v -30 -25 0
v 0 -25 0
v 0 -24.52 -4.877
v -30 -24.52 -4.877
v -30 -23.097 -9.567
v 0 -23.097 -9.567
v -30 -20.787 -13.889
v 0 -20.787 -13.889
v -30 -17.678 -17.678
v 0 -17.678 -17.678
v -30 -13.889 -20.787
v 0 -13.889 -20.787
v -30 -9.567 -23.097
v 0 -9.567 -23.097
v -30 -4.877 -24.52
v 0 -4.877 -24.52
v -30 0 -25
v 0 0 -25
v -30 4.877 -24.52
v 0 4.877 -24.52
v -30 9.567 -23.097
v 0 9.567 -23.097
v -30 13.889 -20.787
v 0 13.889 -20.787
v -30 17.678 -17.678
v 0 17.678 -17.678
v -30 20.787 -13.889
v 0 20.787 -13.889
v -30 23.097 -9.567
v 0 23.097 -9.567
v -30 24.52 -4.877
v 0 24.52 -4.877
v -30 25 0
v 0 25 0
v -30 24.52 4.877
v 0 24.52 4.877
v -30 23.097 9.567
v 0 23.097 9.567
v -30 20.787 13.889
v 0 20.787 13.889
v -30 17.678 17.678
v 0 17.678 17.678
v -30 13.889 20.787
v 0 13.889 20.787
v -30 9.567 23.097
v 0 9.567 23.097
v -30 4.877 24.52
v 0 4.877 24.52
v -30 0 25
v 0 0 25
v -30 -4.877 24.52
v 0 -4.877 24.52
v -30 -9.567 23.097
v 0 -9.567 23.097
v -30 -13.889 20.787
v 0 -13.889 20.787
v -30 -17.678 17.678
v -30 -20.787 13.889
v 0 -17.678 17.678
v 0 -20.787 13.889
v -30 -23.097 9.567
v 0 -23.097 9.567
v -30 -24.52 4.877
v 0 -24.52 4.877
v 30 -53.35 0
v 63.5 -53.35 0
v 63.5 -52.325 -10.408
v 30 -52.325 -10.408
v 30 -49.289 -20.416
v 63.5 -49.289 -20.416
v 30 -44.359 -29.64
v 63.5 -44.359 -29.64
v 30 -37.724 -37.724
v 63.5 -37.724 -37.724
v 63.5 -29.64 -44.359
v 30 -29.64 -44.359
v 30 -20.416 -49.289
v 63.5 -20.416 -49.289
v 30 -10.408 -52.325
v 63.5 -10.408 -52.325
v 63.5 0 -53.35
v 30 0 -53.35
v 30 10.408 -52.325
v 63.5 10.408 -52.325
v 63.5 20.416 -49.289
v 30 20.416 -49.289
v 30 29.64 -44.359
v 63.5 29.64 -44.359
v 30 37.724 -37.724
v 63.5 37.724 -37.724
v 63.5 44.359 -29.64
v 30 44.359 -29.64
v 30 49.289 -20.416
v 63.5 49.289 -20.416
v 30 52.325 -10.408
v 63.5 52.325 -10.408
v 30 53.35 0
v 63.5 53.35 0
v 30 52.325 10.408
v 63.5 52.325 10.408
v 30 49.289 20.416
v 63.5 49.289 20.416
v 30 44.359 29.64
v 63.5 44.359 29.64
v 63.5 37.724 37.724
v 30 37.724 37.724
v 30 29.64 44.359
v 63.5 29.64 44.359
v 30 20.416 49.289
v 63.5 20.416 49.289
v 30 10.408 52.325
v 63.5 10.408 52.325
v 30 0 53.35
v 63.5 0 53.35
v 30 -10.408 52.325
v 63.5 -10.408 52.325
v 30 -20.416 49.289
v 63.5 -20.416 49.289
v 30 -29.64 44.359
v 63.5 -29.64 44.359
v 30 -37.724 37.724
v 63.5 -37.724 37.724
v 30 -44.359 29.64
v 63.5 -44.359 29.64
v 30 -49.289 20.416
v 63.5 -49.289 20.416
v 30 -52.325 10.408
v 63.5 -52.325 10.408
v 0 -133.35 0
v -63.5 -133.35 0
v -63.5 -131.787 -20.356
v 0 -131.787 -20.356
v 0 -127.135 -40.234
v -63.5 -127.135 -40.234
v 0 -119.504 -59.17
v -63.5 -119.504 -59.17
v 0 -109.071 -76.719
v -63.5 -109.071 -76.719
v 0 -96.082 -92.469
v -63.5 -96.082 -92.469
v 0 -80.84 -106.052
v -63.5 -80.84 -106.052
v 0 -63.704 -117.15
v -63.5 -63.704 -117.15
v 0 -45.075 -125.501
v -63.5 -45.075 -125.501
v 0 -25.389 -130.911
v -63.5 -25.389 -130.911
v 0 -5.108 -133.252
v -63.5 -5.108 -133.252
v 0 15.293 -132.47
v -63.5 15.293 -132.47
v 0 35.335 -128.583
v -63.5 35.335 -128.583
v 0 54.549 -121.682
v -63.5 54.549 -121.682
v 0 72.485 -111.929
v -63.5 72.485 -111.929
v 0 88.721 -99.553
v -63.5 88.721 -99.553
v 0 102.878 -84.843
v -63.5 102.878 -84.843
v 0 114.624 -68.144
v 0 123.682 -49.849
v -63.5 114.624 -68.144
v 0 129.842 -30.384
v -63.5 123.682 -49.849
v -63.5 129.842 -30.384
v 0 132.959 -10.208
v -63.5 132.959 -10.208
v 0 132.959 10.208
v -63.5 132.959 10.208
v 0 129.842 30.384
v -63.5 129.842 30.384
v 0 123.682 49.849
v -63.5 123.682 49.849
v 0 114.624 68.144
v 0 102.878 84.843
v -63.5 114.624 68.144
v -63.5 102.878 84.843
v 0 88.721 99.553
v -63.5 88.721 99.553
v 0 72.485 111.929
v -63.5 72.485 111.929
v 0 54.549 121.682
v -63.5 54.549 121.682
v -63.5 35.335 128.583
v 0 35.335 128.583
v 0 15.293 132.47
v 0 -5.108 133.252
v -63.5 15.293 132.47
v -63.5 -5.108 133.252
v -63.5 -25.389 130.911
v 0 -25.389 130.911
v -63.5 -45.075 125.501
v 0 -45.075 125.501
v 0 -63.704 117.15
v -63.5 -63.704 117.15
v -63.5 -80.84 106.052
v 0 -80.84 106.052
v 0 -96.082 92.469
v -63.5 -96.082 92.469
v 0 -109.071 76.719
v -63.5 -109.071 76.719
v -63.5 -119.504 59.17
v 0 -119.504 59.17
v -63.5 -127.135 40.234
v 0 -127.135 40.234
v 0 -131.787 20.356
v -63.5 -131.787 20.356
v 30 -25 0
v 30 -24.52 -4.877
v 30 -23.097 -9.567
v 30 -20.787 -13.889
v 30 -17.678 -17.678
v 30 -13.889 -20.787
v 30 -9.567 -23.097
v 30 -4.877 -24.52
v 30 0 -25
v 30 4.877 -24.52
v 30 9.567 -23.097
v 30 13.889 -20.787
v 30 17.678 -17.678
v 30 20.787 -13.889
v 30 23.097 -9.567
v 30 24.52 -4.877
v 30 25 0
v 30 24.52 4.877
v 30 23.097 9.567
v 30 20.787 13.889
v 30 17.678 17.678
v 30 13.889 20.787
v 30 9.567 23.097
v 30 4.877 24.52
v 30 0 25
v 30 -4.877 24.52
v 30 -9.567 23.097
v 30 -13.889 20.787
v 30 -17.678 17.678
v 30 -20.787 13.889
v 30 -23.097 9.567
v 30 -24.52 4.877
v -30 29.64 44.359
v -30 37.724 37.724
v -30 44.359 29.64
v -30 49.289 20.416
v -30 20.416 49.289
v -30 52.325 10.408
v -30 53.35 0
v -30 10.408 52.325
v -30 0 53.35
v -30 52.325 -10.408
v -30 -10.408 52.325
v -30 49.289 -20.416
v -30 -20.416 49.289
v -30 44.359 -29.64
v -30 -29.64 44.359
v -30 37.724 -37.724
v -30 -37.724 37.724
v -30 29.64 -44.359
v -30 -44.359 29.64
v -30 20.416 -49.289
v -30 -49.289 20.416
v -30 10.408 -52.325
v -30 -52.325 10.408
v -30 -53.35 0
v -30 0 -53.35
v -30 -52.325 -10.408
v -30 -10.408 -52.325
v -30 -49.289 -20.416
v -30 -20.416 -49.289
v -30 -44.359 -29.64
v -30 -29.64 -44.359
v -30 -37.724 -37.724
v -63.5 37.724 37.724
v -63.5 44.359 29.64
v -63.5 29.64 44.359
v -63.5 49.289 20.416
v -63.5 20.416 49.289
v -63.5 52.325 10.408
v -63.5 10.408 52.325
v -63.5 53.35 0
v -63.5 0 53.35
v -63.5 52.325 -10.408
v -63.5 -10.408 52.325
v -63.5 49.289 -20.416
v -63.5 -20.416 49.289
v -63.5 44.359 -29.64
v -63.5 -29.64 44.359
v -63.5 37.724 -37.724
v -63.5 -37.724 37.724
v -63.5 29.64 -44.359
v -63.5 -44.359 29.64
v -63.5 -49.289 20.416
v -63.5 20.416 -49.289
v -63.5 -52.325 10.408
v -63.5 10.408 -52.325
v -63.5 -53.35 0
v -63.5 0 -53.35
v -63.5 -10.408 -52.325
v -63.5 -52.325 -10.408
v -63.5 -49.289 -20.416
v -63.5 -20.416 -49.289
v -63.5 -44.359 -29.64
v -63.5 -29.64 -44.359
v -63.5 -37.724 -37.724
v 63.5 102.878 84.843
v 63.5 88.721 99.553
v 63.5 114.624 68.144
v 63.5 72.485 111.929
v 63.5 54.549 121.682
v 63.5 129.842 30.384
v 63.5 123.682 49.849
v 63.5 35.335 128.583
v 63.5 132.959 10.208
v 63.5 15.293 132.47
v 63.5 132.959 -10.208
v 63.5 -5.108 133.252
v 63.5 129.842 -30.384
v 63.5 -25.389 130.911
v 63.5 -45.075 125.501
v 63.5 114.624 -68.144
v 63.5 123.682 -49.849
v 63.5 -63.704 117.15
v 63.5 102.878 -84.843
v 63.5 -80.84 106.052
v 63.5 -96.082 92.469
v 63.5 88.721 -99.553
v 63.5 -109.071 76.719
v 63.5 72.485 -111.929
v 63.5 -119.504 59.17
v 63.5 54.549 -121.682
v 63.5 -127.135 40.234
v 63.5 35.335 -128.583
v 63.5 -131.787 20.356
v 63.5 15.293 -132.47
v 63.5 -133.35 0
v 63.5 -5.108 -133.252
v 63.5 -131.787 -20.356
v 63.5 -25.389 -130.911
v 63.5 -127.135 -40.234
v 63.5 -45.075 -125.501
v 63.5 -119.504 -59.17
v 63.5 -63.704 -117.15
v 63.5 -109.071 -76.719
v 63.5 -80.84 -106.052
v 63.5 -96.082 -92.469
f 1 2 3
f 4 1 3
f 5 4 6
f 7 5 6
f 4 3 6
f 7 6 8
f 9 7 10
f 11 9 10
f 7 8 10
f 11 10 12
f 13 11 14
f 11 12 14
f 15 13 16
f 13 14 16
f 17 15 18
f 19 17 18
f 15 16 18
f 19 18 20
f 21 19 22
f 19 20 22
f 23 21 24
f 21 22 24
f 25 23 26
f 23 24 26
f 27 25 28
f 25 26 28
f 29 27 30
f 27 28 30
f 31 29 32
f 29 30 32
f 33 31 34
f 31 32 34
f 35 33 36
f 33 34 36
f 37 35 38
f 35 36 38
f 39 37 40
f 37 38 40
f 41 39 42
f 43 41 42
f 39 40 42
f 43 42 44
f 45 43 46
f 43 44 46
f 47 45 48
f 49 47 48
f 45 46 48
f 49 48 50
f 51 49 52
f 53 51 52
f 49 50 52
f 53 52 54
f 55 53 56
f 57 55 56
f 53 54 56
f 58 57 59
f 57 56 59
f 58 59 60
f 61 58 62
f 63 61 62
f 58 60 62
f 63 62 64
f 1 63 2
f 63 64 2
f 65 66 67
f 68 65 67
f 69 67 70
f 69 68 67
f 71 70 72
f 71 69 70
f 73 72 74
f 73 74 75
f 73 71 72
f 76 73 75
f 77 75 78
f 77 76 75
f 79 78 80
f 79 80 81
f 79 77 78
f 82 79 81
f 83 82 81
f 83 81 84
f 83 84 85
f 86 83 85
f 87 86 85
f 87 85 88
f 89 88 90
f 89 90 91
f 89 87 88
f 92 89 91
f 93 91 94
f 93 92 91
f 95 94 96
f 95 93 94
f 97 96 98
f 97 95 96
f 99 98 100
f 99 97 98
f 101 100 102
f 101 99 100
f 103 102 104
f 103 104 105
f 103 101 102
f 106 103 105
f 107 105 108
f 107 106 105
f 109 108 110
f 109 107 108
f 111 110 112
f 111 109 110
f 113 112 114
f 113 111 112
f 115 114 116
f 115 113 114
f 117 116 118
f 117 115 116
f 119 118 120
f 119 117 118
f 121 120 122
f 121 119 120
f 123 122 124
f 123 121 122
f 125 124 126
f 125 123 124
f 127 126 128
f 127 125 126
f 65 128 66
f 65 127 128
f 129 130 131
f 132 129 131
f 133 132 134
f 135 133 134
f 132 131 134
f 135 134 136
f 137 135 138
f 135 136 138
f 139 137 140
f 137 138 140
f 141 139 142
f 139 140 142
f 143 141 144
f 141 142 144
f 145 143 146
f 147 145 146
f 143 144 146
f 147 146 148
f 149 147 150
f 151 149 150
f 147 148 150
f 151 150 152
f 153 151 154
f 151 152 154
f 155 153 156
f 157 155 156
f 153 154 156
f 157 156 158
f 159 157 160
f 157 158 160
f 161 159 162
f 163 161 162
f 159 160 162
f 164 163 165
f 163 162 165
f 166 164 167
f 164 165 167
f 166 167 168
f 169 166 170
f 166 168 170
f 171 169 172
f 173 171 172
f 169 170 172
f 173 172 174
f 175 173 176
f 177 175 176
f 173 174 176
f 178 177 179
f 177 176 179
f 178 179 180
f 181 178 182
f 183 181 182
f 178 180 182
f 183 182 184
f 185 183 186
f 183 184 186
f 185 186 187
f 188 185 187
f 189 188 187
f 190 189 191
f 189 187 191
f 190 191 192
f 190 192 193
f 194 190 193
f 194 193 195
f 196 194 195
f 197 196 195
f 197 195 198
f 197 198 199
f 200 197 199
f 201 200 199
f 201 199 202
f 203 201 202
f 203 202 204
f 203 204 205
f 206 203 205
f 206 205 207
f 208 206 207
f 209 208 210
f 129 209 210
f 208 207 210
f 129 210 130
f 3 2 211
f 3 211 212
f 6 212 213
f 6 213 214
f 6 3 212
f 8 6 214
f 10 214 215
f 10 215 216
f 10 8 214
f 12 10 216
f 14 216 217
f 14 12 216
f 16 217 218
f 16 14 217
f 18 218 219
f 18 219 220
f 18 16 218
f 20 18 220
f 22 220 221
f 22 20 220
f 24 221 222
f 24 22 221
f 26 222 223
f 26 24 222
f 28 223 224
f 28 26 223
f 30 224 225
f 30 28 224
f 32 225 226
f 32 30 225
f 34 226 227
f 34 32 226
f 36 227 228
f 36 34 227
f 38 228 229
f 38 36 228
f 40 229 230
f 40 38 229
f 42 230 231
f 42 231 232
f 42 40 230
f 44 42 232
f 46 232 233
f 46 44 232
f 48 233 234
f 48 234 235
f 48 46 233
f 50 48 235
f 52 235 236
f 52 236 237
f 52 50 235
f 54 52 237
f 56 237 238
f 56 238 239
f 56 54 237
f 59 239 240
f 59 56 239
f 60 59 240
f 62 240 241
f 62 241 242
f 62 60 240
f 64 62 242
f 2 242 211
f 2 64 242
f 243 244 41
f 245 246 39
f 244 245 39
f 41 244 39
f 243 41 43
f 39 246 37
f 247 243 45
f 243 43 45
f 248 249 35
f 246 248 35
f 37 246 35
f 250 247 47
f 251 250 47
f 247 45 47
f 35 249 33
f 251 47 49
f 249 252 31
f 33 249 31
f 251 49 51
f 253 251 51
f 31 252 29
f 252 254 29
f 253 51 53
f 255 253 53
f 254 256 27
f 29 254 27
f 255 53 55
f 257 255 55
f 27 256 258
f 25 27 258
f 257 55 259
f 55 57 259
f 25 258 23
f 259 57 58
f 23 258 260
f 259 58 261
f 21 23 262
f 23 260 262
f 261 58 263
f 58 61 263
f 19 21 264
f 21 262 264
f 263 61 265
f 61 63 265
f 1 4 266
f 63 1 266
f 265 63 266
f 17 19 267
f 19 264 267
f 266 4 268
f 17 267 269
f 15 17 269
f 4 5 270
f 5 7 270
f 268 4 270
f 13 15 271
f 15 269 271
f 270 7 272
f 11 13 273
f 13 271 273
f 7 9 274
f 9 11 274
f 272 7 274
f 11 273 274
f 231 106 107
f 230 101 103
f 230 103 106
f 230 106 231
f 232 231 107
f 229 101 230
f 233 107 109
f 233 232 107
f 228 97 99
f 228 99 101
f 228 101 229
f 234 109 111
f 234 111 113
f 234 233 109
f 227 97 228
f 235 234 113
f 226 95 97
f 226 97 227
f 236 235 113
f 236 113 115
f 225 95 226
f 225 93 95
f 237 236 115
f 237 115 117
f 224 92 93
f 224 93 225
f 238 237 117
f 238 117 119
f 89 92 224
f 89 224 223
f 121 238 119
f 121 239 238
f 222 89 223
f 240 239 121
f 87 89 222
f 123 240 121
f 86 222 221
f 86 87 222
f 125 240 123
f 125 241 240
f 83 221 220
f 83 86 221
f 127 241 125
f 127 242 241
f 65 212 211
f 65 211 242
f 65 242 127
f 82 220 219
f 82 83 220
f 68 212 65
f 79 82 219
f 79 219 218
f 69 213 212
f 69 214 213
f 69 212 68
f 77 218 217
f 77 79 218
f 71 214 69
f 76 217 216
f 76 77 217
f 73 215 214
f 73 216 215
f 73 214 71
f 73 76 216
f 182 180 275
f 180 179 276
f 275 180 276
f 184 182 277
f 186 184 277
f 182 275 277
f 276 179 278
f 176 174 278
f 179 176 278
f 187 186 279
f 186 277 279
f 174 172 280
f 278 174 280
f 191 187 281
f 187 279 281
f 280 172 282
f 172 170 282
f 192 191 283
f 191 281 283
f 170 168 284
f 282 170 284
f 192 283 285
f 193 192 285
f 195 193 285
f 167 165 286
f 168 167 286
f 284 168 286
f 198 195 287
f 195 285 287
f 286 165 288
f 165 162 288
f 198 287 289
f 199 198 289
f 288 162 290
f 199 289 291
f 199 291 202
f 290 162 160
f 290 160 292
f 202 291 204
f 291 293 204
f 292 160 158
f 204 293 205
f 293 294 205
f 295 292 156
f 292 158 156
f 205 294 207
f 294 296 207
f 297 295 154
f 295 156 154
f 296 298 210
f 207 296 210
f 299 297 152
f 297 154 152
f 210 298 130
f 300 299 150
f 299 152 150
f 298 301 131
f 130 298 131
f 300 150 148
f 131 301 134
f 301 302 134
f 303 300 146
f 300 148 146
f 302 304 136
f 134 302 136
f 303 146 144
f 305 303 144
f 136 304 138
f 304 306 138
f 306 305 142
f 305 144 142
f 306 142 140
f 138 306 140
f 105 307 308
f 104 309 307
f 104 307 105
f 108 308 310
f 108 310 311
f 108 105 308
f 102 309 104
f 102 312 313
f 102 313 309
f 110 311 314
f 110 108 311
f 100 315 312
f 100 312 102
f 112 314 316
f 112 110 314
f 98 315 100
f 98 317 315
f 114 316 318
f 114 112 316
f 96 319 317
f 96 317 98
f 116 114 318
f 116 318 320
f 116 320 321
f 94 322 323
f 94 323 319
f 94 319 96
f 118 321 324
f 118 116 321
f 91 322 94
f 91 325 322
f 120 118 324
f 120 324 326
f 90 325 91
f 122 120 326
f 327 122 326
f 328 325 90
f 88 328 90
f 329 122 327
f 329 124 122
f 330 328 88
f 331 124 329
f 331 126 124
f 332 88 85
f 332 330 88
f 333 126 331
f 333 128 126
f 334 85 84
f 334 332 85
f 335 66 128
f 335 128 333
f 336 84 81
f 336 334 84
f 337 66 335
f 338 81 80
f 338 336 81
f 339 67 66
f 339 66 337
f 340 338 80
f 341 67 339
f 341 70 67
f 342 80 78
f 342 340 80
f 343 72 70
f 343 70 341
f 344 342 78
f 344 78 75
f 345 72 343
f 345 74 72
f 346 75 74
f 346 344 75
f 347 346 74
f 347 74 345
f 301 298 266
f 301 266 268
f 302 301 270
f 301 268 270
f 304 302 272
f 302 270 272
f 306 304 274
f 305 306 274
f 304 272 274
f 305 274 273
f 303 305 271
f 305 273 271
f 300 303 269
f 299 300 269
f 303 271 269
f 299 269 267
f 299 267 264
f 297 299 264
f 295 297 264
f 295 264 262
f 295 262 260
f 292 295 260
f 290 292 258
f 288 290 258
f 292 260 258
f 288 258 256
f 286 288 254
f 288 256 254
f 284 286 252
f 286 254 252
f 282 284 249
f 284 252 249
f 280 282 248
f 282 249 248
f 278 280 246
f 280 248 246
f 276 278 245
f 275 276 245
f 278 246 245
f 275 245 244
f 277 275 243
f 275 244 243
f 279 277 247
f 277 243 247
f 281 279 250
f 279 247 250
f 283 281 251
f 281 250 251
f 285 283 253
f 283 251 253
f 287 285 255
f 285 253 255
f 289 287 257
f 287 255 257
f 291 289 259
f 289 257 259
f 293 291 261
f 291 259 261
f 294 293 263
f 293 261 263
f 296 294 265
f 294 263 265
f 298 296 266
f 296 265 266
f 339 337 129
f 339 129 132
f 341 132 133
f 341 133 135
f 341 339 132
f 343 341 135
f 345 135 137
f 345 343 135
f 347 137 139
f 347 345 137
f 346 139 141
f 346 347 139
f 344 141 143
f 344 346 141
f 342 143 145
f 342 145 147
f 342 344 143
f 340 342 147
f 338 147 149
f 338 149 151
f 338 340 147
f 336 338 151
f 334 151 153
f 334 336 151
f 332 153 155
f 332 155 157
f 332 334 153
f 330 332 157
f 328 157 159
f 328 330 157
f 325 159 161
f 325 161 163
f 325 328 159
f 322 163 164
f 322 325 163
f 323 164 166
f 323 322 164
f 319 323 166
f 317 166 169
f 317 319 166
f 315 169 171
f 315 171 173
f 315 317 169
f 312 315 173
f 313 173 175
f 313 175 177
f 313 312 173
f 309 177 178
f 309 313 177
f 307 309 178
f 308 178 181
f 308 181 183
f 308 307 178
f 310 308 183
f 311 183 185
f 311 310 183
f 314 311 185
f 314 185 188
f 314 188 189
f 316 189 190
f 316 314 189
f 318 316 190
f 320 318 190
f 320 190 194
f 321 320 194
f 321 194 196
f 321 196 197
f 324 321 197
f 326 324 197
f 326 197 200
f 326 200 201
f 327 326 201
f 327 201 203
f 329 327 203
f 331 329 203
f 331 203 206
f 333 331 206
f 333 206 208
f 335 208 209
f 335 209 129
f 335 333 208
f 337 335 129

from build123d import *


with BuildPart() as part:
    # Sketch1 → Revolve1 (revolve)
    with BuildSketch(Plane.XY):
        Polygon((0, -25), (0, -133.35), (-63.5, -133.35), (-63.5, -53.35), (-30, -53.35), (-30, -25), align=None)
    revolve1 = revolve(axis=Axis((-62.857142857, 0, 0), (1, 0, 0)))

    # Mirror1: Revolve1 across plane
    add(revolve1.mirror(Plane(origin=(0, 0, 0), x_dir=(0, 0, 1), z_dir=(1, 0, 0))))


solid = part.part
